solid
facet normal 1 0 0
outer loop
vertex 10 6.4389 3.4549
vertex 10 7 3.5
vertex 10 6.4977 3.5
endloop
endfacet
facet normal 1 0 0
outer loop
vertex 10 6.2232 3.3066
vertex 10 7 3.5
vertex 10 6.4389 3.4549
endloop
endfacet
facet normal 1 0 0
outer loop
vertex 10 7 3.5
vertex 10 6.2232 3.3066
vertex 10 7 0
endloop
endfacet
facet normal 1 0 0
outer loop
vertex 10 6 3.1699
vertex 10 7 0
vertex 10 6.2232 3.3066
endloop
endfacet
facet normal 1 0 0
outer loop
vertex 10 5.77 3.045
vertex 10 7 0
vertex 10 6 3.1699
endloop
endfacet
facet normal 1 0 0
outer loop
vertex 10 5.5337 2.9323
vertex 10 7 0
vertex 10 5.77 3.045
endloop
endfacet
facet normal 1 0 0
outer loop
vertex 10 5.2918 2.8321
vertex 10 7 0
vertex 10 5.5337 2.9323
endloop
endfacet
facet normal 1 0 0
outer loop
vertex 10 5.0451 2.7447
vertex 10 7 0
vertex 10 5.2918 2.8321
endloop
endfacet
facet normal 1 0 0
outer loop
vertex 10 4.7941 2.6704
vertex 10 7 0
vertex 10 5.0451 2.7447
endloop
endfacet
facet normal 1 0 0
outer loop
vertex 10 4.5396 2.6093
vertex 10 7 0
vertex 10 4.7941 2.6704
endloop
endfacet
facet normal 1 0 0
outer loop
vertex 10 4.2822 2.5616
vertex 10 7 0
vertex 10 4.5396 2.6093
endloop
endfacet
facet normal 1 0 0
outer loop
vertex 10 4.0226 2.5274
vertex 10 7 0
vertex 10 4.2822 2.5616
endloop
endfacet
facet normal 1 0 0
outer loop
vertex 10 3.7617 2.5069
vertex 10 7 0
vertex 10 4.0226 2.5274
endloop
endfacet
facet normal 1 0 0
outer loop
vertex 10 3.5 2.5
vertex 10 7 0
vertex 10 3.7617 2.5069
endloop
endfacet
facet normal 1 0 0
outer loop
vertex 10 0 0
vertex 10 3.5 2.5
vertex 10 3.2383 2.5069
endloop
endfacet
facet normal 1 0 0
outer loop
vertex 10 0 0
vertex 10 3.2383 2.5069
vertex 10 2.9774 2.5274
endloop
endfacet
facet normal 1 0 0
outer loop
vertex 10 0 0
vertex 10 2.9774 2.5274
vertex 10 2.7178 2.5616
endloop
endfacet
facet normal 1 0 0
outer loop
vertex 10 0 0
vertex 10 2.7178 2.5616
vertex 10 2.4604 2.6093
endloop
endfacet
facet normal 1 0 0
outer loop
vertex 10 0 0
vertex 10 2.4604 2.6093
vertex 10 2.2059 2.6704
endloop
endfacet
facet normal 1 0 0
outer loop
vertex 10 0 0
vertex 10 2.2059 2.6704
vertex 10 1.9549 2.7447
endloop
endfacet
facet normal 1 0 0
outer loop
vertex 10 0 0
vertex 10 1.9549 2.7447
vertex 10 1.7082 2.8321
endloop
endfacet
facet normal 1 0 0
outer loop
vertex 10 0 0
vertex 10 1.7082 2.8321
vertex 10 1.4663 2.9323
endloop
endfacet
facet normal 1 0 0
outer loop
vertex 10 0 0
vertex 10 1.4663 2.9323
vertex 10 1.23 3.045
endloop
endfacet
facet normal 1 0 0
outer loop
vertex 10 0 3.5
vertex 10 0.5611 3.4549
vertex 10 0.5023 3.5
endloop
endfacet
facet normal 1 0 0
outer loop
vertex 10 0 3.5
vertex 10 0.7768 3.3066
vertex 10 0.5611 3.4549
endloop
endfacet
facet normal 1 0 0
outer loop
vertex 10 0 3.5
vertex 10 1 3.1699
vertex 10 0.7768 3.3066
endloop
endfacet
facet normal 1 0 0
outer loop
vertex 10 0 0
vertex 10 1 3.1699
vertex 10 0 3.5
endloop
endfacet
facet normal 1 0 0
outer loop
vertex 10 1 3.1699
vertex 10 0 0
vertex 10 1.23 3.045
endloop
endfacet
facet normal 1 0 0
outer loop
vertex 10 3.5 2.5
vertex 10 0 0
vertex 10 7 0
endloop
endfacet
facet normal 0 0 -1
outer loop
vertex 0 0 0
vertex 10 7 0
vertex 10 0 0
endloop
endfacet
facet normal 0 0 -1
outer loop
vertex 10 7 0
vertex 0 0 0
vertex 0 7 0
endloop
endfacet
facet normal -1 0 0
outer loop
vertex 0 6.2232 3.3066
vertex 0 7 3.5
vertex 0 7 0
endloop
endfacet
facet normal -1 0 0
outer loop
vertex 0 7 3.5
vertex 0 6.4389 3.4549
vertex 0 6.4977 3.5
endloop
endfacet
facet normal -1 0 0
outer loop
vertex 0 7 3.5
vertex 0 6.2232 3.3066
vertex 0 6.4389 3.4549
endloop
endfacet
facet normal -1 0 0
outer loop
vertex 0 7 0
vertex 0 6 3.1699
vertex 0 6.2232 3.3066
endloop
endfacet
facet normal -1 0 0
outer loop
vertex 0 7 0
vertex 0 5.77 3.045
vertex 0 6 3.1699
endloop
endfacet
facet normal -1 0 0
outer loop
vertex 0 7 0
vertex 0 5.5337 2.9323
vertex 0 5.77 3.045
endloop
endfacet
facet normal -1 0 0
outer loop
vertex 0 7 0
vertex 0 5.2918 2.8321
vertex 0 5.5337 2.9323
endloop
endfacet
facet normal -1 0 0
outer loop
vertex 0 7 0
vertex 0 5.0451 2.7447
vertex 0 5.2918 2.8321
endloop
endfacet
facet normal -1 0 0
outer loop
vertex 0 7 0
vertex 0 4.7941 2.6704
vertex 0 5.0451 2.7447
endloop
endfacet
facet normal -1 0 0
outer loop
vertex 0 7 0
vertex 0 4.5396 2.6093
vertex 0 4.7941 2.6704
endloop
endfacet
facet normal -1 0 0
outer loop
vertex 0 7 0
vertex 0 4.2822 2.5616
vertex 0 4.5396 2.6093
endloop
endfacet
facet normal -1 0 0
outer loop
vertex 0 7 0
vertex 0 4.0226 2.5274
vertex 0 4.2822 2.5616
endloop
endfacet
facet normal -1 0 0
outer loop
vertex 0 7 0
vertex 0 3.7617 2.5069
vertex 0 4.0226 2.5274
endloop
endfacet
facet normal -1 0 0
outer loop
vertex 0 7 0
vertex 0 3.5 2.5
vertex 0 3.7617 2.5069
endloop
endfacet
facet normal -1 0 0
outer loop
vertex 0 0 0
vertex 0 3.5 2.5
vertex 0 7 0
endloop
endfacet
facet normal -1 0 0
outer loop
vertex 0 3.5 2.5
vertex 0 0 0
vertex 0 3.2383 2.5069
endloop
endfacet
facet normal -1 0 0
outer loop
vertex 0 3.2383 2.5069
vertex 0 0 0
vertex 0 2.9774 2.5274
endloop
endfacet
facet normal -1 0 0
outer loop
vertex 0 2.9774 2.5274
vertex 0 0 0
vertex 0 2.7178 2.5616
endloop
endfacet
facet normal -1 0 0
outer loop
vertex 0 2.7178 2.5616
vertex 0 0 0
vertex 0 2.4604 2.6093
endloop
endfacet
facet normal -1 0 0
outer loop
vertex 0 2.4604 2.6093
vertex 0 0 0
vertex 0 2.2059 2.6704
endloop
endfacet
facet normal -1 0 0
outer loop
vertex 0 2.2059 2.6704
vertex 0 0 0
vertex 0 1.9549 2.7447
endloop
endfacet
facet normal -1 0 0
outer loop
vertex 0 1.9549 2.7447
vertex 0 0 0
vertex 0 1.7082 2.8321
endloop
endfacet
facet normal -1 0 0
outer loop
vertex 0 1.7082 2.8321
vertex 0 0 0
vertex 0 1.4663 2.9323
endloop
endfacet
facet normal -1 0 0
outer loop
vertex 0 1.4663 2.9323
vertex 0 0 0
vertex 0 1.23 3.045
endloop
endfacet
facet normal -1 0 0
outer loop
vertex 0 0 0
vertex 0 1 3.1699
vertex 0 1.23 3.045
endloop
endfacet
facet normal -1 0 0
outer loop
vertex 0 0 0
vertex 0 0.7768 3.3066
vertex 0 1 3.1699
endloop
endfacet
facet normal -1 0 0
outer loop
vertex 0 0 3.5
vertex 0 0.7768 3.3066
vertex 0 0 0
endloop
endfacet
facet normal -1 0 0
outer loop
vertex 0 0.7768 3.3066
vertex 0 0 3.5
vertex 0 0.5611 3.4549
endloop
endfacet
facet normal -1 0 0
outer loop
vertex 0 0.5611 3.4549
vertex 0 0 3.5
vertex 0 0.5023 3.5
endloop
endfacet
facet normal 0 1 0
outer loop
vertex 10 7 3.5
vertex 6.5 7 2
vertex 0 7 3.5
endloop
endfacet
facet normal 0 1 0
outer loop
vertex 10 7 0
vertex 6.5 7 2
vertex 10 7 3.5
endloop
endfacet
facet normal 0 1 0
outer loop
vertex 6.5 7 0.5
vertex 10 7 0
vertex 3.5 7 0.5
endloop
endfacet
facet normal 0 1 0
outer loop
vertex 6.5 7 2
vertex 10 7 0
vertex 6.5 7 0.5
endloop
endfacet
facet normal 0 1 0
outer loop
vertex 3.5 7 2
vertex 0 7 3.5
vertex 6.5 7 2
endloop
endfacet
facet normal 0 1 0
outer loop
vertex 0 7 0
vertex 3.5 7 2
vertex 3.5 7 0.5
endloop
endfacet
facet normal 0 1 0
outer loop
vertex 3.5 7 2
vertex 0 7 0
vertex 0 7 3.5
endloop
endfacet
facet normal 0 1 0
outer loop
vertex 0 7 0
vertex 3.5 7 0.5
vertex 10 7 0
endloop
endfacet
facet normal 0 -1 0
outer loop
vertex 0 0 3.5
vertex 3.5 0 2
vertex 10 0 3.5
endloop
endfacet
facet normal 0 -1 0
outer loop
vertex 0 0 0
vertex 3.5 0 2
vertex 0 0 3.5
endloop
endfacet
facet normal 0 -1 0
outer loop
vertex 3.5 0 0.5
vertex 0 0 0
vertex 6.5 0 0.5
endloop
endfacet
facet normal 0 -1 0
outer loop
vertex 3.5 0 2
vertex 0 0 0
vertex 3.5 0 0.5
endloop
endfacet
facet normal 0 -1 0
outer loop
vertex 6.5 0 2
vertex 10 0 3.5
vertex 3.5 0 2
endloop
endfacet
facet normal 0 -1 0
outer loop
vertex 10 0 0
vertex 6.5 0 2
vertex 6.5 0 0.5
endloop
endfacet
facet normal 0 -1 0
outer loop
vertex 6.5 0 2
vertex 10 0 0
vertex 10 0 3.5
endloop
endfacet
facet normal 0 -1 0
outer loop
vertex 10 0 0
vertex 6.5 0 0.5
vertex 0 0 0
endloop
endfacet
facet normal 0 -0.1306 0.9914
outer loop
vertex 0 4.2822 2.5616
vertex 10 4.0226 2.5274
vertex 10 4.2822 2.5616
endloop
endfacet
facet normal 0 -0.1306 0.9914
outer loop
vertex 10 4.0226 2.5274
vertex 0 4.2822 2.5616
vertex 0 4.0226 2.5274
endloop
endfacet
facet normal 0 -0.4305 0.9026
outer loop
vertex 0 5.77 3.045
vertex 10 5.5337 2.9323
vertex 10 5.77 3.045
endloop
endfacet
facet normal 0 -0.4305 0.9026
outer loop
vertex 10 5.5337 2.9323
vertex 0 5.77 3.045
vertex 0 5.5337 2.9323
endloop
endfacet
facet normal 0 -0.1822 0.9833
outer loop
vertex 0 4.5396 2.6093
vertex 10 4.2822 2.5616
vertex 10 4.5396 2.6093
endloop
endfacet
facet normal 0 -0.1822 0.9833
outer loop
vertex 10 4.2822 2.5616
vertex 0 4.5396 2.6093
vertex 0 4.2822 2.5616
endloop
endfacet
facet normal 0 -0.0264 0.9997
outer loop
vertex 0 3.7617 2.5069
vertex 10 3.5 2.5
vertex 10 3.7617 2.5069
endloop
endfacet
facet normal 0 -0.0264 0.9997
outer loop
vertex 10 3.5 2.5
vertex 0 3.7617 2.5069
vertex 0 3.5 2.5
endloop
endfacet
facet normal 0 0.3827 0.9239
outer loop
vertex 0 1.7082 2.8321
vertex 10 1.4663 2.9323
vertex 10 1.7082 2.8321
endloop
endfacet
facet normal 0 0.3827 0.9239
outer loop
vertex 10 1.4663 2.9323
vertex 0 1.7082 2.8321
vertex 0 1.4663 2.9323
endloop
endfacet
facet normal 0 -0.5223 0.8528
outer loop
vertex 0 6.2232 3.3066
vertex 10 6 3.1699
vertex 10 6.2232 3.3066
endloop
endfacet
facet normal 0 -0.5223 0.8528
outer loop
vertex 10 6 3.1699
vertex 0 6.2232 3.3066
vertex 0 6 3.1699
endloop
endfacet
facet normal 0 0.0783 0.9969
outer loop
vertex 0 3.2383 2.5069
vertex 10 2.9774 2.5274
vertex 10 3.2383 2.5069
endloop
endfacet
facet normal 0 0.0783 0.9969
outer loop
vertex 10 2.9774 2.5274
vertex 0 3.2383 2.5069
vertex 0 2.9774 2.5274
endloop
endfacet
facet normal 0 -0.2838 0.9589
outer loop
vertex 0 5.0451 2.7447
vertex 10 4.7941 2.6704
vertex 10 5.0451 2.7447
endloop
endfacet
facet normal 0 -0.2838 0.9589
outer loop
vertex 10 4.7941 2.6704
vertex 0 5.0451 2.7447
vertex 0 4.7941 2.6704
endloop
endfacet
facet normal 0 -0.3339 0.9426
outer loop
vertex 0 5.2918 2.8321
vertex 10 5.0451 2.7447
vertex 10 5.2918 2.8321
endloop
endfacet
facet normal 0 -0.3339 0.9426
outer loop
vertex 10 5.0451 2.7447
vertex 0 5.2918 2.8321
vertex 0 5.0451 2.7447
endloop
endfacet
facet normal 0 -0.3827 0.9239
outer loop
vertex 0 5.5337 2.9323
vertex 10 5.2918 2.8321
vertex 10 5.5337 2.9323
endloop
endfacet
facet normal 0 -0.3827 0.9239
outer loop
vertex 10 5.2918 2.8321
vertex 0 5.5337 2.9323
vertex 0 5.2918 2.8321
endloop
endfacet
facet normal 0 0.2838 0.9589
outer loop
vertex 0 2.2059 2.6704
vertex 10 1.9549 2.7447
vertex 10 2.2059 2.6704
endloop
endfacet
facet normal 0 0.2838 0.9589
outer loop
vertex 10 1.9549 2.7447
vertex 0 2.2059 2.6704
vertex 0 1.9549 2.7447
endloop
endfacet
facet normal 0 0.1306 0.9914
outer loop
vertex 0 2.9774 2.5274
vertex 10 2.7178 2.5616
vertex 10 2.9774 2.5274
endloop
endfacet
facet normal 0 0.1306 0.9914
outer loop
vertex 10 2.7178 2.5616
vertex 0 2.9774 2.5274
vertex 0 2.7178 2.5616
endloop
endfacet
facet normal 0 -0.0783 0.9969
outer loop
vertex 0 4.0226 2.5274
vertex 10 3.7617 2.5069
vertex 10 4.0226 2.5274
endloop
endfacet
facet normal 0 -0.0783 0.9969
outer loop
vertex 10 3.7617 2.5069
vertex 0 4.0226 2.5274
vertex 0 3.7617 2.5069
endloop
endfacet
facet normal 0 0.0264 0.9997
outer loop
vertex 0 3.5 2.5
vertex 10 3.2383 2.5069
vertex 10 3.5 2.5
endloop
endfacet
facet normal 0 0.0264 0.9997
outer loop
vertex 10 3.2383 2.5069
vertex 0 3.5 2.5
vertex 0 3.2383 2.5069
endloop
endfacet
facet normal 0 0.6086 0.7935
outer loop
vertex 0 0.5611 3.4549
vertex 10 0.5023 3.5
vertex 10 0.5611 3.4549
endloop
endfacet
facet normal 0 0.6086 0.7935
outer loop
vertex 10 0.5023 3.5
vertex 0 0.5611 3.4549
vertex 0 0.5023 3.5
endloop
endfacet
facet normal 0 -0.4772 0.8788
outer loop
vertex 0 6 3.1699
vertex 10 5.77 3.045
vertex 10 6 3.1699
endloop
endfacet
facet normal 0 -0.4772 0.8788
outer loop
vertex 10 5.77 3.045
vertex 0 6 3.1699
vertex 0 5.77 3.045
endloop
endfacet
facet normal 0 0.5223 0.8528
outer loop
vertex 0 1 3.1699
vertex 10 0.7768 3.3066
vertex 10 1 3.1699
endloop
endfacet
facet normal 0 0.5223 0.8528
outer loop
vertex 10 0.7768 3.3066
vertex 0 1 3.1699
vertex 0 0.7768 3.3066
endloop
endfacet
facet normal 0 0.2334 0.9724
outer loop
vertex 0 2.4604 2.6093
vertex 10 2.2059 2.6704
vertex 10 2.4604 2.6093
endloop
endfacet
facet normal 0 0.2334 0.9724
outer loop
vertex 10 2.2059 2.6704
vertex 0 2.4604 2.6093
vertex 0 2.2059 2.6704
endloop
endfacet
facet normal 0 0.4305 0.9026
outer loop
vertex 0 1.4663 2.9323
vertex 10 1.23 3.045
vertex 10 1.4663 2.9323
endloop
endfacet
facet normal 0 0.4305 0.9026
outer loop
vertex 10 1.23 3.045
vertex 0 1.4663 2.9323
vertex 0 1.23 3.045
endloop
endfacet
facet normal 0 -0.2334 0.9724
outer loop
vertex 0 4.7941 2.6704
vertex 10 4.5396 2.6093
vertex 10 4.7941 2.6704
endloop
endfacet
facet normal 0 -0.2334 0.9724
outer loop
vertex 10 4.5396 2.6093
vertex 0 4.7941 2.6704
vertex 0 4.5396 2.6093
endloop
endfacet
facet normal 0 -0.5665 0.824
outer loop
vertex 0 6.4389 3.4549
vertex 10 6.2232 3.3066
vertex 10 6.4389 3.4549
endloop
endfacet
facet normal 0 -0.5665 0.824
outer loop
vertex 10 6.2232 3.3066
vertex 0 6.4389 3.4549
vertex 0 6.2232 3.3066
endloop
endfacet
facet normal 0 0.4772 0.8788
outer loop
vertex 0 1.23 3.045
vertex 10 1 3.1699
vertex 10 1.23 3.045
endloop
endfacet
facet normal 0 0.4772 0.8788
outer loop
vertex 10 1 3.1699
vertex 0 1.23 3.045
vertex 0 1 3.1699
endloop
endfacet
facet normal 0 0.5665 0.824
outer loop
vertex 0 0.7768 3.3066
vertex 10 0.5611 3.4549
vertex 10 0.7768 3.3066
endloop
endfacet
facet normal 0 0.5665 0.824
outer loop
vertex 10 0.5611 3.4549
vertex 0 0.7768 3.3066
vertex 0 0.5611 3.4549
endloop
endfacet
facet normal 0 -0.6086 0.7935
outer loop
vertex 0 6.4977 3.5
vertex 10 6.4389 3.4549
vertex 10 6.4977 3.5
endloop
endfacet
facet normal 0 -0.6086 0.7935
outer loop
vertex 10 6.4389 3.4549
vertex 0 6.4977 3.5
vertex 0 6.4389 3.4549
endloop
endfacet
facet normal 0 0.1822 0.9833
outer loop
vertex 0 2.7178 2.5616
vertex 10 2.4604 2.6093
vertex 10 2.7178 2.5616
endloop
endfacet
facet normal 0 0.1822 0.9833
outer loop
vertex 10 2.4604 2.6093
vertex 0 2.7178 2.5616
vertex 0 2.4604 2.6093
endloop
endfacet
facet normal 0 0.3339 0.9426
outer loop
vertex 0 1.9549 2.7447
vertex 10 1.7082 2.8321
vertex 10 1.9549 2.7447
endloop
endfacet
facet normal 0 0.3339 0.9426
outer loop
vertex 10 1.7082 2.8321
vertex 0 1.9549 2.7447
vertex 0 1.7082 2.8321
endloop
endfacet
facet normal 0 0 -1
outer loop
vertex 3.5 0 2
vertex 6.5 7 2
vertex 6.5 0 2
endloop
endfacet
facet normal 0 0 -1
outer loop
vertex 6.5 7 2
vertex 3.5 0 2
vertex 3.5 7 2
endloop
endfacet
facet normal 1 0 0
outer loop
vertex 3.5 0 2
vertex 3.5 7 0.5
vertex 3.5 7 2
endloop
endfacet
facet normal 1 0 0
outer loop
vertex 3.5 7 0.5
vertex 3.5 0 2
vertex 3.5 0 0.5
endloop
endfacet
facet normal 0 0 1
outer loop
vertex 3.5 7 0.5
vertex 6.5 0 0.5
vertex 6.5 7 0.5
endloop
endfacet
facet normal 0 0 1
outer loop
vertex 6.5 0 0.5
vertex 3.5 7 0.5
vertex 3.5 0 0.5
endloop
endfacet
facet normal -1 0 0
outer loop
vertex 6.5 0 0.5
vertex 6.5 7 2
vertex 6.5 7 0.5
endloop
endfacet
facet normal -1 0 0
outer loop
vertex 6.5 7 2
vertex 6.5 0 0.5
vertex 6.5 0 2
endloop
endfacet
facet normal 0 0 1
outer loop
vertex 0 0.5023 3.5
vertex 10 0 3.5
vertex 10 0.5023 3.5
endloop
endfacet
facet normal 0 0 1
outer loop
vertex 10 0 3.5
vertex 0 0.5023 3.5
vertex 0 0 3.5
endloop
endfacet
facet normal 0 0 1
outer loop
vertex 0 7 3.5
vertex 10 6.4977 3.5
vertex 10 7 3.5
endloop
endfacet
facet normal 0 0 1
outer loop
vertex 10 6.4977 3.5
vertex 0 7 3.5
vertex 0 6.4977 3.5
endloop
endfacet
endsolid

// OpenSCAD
// tinyZipTieMnt.scad - A Tiny Ziptie Mount
// 2022 - Gregory A. Sanders
//
$fn=120;

module mnt(){
difference(){
cube([10,7,8]);
union(){
    rotate([0,90,0])
    translate([-7.5,3.5,-1.5])
    cylinder(12,d=10);
}
rotate([0,0,90])
translate([-4,-6.5,.5])
cube([16,3,1.5]);
translate([-1,-1,3.5])
cube([14,10,10]);
}
}

mnt();
